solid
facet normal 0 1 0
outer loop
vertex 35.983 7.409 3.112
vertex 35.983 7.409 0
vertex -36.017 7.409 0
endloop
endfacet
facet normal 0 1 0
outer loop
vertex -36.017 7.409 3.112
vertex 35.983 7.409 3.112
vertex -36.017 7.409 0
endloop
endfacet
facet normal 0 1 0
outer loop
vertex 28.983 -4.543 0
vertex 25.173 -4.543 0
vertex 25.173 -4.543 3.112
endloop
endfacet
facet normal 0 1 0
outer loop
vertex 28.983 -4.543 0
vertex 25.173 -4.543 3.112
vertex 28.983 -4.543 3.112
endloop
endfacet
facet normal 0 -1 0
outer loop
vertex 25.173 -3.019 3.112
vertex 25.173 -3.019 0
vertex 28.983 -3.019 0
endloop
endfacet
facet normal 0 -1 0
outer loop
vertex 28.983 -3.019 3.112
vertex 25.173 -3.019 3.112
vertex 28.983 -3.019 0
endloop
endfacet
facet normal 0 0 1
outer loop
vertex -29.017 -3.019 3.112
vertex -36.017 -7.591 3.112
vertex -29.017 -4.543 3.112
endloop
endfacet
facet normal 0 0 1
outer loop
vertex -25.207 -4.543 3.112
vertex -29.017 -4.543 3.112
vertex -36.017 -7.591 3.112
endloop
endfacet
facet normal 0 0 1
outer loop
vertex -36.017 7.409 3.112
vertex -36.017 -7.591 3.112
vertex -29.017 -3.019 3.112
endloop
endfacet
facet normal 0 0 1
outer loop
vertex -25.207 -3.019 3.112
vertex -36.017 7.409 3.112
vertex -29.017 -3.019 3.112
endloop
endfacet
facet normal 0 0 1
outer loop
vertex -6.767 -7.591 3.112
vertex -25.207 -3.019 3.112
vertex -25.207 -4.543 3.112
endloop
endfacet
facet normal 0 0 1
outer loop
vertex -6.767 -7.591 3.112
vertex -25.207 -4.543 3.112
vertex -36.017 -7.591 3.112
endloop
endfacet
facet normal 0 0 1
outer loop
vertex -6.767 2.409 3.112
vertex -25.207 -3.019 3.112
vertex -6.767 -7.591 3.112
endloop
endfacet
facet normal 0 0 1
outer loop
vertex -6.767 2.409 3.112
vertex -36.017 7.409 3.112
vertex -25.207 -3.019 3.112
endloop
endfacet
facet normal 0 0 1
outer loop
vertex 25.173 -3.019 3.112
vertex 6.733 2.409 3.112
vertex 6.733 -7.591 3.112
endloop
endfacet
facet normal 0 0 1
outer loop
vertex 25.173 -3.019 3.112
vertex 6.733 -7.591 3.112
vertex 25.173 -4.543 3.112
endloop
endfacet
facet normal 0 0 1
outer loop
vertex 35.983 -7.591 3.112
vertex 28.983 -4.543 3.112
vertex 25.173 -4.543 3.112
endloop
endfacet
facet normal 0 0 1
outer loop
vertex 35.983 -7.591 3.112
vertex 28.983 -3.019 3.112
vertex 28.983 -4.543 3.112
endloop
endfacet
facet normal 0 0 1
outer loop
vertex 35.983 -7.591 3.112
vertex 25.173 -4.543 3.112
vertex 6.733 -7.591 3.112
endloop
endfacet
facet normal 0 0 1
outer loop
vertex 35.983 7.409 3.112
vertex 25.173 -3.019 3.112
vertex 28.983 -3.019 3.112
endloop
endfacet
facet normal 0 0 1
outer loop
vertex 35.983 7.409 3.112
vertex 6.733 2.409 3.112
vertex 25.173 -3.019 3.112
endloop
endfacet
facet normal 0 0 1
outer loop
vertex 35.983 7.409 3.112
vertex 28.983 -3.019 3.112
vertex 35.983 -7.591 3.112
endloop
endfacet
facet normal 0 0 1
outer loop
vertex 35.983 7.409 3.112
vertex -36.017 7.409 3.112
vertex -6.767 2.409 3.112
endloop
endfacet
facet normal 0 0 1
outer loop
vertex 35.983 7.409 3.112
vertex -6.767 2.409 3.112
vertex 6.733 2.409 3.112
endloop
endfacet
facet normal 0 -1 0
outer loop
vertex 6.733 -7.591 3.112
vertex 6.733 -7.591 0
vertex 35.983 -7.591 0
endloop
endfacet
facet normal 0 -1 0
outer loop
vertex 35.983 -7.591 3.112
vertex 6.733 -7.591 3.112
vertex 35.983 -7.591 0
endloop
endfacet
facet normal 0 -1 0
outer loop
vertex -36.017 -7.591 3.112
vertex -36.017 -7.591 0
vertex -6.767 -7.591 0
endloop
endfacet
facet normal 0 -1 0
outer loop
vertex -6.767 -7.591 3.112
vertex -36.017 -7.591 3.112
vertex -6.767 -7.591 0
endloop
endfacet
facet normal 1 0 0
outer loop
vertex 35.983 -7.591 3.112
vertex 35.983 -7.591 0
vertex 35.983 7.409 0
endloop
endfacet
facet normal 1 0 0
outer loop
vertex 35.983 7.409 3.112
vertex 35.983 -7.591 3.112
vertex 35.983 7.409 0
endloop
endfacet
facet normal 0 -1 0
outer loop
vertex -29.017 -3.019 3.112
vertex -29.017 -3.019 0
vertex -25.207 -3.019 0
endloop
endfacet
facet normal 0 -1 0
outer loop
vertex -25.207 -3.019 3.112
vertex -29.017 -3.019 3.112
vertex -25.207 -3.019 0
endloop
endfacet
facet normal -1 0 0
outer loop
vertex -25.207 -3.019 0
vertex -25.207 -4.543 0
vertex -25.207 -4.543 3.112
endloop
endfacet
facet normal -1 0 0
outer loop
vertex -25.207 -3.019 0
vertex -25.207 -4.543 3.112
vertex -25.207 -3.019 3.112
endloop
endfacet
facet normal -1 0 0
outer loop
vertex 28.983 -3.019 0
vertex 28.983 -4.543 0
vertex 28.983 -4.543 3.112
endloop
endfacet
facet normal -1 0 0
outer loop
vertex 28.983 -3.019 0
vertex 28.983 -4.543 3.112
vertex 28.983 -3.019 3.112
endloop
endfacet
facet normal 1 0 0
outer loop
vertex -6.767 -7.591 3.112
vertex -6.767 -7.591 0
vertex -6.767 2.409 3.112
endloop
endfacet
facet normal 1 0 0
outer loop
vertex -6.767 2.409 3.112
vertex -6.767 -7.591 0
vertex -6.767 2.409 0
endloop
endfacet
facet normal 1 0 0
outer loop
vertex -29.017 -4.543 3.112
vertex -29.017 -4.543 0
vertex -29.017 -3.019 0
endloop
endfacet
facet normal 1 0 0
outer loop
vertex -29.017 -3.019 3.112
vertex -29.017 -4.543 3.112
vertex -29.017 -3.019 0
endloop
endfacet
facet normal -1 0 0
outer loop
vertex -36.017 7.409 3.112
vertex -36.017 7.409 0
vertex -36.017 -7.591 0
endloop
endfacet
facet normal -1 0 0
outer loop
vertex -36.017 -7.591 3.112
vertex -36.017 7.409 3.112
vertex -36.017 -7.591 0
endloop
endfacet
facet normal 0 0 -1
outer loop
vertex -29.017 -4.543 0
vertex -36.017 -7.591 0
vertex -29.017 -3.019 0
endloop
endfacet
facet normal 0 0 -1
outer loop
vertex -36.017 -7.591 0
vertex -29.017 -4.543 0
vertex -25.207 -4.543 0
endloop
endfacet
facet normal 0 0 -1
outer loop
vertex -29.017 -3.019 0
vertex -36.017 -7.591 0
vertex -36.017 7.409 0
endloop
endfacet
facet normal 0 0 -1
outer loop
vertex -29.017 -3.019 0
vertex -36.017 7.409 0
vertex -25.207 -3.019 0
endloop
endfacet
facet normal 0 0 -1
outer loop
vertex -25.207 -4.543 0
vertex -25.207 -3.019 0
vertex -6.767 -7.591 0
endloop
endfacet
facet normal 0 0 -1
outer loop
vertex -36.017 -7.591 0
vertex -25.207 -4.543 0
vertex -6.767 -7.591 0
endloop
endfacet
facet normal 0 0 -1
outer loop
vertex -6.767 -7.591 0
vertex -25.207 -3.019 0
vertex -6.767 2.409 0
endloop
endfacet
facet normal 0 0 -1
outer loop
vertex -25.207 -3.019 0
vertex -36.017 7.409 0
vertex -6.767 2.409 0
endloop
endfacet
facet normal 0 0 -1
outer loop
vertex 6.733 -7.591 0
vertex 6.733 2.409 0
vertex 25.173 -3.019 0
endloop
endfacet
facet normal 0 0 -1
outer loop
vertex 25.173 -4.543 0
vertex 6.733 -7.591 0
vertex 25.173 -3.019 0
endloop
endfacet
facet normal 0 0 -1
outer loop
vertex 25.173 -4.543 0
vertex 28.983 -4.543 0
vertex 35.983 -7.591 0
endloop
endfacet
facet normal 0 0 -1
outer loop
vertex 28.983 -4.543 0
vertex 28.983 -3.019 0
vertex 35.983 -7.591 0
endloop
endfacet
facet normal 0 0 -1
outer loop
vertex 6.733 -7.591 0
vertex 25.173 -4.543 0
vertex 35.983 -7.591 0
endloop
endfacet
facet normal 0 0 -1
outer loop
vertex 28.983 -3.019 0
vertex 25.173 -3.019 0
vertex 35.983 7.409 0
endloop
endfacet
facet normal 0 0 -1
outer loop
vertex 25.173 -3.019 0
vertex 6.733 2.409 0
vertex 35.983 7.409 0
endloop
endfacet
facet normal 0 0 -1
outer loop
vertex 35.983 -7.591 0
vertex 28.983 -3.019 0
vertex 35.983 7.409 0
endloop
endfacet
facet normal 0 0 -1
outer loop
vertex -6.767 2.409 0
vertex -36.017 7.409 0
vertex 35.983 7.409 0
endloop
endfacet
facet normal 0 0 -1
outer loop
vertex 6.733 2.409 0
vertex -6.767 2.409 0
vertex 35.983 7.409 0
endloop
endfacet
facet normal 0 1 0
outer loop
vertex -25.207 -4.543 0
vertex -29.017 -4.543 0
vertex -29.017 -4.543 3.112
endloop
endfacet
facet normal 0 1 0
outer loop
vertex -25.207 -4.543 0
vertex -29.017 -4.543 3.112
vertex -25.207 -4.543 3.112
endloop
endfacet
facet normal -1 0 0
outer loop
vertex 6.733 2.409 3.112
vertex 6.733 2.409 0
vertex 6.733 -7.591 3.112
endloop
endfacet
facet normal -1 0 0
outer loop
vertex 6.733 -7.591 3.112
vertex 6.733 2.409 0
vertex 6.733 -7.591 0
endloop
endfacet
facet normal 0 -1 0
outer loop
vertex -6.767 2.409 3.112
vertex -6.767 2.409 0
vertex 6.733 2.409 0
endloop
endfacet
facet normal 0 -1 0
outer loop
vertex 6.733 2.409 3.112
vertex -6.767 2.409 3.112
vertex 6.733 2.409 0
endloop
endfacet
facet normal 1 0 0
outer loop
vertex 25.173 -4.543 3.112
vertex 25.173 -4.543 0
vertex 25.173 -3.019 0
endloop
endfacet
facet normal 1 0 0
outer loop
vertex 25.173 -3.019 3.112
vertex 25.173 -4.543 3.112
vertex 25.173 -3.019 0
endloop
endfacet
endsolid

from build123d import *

# Parameters (mm, degrees)
SKETCH1_W           = 3.81
SKETCH1_H           = 1.524
BOSS_EXTRUDE1_DEPTH = 3.1115


with BuildPart() as part:
    # Sketch1 → Boss-Extrude1 (new body)
    with BuildSketch(Plane.XY):
        Polygon((-36.017419718, -7.591435707), (-6.767419718, -7.591435707), (-6.767419718, 2.408564293), (6.732580282, 2.408564293), (6.732580282, -7.591435707), (35.982580282, -7.591435707), (35.982580282, -5.091435707), (35.982580282, 4.908564293), (35.982580282, 7.408564293), (-36.017419718, 7.408564293), (-36.017419718, 4.908564293), (-36.017419718, -5.091435707), align=None)
        with Locations((27.077580282, -3.781435707)):
            Rectangle(SKETCH1_W, SKETCH1_H, mode=Mode.SUBTRACT)
        with Locations((-27.112419718, -3.781435707)):
            Rectangle(SKETCH1_W, SKETCH1_H, mode=Mode.SUBTRACT)
    extrude(amount=BOSS_EXTRUDE1_DEPTH)


solid = part.part
